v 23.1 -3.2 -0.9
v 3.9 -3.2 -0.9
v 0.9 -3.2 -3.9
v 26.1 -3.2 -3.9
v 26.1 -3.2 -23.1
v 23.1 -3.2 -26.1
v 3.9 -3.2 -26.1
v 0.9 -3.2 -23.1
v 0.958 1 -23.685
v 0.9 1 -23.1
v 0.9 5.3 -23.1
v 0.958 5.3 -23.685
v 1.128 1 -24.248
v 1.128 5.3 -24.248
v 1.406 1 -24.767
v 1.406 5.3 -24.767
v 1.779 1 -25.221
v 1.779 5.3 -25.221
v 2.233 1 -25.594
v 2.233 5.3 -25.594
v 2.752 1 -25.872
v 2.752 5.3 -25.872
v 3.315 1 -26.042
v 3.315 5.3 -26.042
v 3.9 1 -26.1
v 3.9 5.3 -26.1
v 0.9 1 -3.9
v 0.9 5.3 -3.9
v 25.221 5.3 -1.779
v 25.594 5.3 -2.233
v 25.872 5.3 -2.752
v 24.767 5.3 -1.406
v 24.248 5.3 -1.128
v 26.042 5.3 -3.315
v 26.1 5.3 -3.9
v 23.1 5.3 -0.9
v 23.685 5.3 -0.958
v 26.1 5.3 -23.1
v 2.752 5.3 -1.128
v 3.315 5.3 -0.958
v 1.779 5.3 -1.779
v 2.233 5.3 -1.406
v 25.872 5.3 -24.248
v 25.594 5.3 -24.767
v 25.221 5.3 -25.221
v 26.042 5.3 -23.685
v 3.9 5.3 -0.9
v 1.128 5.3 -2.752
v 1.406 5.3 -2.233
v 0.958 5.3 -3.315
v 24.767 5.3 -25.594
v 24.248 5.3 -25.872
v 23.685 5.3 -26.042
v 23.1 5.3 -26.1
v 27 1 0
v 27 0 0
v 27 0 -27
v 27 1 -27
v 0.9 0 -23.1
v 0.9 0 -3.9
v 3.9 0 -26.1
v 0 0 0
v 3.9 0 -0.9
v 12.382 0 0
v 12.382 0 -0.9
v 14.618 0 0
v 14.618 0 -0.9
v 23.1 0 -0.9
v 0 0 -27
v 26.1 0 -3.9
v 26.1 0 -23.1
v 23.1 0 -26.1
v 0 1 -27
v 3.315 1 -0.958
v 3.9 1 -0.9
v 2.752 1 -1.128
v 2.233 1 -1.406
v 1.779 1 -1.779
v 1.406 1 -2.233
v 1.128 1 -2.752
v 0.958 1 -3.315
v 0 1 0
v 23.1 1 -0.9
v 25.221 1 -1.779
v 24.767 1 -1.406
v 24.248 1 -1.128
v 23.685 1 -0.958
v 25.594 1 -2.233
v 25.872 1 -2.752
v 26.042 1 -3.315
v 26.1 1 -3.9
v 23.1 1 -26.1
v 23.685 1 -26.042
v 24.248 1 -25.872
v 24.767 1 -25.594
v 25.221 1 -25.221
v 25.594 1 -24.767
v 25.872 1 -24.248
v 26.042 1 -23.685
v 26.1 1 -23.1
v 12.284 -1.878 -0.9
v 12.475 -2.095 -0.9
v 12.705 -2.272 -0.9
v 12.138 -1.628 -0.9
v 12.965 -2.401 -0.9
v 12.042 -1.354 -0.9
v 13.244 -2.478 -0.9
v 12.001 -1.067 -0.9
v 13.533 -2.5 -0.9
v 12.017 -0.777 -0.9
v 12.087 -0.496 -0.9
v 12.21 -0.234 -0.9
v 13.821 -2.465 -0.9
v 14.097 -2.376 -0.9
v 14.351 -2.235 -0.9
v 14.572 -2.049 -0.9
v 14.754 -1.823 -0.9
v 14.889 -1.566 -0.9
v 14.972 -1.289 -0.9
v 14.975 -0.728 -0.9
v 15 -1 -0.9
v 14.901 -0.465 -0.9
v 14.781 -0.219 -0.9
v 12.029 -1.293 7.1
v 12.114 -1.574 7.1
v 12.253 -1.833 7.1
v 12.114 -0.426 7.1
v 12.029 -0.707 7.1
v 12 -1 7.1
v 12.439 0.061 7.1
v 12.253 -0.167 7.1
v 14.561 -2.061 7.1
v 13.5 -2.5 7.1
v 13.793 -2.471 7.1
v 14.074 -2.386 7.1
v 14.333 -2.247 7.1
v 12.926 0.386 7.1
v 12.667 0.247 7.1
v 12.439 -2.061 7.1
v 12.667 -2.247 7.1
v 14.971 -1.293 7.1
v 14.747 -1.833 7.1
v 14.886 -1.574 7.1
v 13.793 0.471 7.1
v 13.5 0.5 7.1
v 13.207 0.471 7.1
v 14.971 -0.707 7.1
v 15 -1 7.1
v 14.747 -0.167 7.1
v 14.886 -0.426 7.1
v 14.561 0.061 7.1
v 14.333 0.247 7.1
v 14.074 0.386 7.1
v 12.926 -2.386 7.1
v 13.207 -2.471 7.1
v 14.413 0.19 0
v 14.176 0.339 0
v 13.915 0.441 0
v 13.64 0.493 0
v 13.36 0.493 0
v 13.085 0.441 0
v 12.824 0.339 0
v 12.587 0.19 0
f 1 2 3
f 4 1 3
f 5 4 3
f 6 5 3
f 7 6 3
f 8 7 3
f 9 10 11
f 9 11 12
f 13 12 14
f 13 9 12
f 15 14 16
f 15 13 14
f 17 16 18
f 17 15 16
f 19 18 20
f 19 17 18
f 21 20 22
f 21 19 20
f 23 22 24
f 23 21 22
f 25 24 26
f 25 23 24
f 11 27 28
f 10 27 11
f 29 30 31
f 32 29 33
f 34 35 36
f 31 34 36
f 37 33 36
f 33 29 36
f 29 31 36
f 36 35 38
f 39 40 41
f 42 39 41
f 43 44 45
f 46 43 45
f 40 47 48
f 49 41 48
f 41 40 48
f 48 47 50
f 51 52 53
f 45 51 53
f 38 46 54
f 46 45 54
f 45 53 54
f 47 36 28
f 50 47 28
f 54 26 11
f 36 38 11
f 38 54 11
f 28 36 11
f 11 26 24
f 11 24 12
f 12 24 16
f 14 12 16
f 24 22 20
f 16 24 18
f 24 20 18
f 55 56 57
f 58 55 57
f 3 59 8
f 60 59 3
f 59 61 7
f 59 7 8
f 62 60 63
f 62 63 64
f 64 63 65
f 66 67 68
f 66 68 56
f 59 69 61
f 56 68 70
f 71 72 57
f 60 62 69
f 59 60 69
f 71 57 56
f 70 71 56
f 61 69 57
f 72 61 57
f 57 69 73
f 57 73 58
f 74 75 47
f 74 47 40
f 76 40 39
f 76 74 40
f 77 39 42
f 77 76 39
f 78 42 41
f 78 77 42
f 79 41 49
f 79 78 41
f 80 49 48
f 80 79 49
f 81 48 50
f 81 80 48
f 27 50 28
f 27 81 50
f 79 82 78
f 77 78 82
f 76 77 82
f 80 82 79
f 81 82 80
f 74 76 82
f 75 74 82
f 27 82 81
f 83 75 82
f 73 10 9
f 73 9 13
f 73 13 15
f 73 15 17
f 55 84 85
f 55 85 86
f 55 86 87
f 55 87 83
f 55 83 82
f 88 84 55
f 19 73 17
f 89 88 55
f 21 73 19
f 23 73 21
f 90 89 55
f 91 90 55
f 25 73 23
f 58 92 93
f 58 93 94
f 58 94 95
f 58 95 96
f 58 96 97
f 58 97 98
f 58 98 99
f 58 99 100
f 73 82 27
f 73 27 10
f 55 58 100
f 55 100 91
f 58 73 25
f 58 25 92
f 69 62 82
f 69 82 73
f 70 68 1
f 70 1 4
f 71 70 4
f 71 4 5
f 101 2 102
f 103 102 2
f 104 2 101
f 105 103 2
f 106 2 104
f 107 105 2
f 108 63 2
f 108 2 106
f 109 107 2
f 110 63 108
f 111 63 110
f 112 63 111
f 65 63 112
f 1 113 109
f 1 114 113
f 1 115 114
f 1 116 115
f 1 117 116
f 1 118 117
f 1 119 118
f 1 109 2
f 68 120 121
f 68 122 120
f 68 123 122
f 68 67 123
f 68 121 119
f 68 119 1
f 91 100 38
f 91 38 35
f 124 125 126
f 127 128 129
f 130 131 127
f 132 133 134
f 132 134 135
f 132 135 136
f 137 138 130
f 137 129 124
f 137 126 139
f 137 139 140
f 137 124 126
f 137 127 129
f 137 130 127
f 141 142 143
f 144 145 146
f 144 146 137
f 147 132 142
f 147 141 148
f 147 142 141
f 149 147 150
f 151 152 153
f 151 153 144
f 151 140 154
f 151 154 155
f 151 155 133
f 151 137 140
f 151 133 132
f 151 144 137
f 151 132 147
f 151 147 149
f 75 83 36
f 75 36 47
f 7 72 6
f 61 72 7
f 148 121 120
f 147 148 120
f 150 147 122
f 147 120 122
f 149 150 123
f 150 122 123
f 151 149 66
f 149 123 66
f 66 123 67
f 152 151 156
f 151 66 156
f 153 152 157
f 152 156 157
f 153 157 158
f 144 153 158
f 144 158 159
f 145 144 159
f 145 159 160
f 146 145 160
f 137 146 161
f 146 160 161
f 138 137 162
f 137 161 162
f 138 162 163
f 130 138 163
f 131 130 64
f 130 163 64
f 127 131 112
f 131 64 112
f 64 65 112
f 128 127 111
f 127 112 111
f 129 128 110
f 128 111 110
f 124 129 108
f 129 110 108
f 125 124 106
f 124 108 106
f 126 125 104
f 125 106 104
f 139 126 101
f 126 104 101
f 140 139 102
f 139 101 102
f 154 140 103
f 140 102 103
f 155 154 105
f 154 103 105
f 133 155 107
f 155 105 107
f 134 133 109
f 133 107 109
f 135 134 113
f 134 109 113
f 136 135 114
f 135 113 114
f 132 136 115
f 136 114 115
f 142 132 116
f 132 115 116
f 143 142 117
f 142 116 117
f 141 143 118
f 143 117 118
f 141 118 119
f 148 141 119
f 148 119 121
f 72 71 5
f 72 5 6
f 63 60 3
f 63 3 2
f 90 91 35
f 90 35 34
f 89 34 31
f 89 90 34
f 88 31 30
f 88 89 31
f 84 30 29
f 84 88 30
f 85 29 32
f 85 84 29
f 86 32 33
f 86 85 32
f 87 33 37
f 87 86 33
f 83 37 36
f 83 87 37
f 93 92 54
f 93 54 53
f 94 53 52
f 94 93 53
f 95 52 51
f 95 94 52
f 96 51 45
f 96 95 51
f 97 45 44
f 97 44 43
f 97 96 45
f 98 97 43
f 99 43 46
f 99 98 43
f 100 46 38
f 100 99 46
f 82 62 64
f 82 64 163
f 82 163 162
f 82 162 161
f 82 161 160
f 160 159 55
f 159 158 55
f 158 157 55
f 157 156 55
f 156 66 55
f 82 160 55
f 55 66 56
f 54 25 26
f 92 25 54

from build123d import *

# Parameters (mm, degrees)
SKETCH1_W           = 27
SKETCH1_H           = 27
BOSS_EXTRUDE1_DEPTH = 1
BOSS_EXTRUDE2_DEPTH = 4.3
BOSS_EXTRUDE3_DEPTH = 3.2
SKETCH4_R           = 1.5
BOSS_EXTRUDE5_DEPTH = 8


with BuildPart() as part:
    # Sketch1 → Boss-Extrude1 (new body)
    with BuildSketch(Plane(origin=(0, 0, 0), x_dir=(1, 0, 0), z_dir=(0, 1, 0))):
        with Locations((13.5, 13.5)):
            Rectangle(SKETCH1_W, SKETCH1_H)
    extrude(amount=BOSS_EXTRUDE1_DEPTH)

    # Sketch2 → Boss-Extrude2 (add)
    with BuildSketch(Plane(origin=(0, 1, 0), x_dir=(1, 0, 0), z_dir=(0, 1, 0))):
        with BuildLine():
            Line((3.9, 26.1), (23.1, 26.1))
            ThreePointArc((23.1, 26.1), (25.221320344, 25.221320344), (26.1, 23.1))
            Line((26.1, 23.1), (26.1, 3.9))
            ThreePointArc((26.1, 3.9), (25.221320344, 1.778679656), (23.1, 0.9))
            Line((23.1, 0.9), (3.9, 0.9))
            ThreePointArc((3.9, 0.9), (1.778679656, 1.778679656), (0.9, 3.9))
            Line((0.9, 3.9), (0.9, 23.1))
            ThreePointArc((0.9, 23.1), (1.778679656, 25.221320344), (3.9, 26.1))
        make_face()
    extrude(amount=BOSS_EXTRUDE2_DEPTH)

    # Sketch3 → Boss-Extrude3 (add)
    with BuildSketch(Plane.XZ):
        Polygon((3.9, -0.9), (23.1, -0.9), (26.1, -3.9), (26.1, -23.1), (23.1, -26.1), (3.9, -26.1), (0.9, -23.1), (0.9, -3.9), align=None)
    extrude(amount=BOSS_EXTRUDE3_DEPTH)

    # Sketch4 → Boss-Extrude5 (add)
    with BuildSketch(Plane.XY.offset(-0.9)):
        with Locations((13.5, -1)):
            Circle(SKETCH4_R)
    extrude(amount=BOSS_EXTRUDE5_DEPTH)


solid = part.part
